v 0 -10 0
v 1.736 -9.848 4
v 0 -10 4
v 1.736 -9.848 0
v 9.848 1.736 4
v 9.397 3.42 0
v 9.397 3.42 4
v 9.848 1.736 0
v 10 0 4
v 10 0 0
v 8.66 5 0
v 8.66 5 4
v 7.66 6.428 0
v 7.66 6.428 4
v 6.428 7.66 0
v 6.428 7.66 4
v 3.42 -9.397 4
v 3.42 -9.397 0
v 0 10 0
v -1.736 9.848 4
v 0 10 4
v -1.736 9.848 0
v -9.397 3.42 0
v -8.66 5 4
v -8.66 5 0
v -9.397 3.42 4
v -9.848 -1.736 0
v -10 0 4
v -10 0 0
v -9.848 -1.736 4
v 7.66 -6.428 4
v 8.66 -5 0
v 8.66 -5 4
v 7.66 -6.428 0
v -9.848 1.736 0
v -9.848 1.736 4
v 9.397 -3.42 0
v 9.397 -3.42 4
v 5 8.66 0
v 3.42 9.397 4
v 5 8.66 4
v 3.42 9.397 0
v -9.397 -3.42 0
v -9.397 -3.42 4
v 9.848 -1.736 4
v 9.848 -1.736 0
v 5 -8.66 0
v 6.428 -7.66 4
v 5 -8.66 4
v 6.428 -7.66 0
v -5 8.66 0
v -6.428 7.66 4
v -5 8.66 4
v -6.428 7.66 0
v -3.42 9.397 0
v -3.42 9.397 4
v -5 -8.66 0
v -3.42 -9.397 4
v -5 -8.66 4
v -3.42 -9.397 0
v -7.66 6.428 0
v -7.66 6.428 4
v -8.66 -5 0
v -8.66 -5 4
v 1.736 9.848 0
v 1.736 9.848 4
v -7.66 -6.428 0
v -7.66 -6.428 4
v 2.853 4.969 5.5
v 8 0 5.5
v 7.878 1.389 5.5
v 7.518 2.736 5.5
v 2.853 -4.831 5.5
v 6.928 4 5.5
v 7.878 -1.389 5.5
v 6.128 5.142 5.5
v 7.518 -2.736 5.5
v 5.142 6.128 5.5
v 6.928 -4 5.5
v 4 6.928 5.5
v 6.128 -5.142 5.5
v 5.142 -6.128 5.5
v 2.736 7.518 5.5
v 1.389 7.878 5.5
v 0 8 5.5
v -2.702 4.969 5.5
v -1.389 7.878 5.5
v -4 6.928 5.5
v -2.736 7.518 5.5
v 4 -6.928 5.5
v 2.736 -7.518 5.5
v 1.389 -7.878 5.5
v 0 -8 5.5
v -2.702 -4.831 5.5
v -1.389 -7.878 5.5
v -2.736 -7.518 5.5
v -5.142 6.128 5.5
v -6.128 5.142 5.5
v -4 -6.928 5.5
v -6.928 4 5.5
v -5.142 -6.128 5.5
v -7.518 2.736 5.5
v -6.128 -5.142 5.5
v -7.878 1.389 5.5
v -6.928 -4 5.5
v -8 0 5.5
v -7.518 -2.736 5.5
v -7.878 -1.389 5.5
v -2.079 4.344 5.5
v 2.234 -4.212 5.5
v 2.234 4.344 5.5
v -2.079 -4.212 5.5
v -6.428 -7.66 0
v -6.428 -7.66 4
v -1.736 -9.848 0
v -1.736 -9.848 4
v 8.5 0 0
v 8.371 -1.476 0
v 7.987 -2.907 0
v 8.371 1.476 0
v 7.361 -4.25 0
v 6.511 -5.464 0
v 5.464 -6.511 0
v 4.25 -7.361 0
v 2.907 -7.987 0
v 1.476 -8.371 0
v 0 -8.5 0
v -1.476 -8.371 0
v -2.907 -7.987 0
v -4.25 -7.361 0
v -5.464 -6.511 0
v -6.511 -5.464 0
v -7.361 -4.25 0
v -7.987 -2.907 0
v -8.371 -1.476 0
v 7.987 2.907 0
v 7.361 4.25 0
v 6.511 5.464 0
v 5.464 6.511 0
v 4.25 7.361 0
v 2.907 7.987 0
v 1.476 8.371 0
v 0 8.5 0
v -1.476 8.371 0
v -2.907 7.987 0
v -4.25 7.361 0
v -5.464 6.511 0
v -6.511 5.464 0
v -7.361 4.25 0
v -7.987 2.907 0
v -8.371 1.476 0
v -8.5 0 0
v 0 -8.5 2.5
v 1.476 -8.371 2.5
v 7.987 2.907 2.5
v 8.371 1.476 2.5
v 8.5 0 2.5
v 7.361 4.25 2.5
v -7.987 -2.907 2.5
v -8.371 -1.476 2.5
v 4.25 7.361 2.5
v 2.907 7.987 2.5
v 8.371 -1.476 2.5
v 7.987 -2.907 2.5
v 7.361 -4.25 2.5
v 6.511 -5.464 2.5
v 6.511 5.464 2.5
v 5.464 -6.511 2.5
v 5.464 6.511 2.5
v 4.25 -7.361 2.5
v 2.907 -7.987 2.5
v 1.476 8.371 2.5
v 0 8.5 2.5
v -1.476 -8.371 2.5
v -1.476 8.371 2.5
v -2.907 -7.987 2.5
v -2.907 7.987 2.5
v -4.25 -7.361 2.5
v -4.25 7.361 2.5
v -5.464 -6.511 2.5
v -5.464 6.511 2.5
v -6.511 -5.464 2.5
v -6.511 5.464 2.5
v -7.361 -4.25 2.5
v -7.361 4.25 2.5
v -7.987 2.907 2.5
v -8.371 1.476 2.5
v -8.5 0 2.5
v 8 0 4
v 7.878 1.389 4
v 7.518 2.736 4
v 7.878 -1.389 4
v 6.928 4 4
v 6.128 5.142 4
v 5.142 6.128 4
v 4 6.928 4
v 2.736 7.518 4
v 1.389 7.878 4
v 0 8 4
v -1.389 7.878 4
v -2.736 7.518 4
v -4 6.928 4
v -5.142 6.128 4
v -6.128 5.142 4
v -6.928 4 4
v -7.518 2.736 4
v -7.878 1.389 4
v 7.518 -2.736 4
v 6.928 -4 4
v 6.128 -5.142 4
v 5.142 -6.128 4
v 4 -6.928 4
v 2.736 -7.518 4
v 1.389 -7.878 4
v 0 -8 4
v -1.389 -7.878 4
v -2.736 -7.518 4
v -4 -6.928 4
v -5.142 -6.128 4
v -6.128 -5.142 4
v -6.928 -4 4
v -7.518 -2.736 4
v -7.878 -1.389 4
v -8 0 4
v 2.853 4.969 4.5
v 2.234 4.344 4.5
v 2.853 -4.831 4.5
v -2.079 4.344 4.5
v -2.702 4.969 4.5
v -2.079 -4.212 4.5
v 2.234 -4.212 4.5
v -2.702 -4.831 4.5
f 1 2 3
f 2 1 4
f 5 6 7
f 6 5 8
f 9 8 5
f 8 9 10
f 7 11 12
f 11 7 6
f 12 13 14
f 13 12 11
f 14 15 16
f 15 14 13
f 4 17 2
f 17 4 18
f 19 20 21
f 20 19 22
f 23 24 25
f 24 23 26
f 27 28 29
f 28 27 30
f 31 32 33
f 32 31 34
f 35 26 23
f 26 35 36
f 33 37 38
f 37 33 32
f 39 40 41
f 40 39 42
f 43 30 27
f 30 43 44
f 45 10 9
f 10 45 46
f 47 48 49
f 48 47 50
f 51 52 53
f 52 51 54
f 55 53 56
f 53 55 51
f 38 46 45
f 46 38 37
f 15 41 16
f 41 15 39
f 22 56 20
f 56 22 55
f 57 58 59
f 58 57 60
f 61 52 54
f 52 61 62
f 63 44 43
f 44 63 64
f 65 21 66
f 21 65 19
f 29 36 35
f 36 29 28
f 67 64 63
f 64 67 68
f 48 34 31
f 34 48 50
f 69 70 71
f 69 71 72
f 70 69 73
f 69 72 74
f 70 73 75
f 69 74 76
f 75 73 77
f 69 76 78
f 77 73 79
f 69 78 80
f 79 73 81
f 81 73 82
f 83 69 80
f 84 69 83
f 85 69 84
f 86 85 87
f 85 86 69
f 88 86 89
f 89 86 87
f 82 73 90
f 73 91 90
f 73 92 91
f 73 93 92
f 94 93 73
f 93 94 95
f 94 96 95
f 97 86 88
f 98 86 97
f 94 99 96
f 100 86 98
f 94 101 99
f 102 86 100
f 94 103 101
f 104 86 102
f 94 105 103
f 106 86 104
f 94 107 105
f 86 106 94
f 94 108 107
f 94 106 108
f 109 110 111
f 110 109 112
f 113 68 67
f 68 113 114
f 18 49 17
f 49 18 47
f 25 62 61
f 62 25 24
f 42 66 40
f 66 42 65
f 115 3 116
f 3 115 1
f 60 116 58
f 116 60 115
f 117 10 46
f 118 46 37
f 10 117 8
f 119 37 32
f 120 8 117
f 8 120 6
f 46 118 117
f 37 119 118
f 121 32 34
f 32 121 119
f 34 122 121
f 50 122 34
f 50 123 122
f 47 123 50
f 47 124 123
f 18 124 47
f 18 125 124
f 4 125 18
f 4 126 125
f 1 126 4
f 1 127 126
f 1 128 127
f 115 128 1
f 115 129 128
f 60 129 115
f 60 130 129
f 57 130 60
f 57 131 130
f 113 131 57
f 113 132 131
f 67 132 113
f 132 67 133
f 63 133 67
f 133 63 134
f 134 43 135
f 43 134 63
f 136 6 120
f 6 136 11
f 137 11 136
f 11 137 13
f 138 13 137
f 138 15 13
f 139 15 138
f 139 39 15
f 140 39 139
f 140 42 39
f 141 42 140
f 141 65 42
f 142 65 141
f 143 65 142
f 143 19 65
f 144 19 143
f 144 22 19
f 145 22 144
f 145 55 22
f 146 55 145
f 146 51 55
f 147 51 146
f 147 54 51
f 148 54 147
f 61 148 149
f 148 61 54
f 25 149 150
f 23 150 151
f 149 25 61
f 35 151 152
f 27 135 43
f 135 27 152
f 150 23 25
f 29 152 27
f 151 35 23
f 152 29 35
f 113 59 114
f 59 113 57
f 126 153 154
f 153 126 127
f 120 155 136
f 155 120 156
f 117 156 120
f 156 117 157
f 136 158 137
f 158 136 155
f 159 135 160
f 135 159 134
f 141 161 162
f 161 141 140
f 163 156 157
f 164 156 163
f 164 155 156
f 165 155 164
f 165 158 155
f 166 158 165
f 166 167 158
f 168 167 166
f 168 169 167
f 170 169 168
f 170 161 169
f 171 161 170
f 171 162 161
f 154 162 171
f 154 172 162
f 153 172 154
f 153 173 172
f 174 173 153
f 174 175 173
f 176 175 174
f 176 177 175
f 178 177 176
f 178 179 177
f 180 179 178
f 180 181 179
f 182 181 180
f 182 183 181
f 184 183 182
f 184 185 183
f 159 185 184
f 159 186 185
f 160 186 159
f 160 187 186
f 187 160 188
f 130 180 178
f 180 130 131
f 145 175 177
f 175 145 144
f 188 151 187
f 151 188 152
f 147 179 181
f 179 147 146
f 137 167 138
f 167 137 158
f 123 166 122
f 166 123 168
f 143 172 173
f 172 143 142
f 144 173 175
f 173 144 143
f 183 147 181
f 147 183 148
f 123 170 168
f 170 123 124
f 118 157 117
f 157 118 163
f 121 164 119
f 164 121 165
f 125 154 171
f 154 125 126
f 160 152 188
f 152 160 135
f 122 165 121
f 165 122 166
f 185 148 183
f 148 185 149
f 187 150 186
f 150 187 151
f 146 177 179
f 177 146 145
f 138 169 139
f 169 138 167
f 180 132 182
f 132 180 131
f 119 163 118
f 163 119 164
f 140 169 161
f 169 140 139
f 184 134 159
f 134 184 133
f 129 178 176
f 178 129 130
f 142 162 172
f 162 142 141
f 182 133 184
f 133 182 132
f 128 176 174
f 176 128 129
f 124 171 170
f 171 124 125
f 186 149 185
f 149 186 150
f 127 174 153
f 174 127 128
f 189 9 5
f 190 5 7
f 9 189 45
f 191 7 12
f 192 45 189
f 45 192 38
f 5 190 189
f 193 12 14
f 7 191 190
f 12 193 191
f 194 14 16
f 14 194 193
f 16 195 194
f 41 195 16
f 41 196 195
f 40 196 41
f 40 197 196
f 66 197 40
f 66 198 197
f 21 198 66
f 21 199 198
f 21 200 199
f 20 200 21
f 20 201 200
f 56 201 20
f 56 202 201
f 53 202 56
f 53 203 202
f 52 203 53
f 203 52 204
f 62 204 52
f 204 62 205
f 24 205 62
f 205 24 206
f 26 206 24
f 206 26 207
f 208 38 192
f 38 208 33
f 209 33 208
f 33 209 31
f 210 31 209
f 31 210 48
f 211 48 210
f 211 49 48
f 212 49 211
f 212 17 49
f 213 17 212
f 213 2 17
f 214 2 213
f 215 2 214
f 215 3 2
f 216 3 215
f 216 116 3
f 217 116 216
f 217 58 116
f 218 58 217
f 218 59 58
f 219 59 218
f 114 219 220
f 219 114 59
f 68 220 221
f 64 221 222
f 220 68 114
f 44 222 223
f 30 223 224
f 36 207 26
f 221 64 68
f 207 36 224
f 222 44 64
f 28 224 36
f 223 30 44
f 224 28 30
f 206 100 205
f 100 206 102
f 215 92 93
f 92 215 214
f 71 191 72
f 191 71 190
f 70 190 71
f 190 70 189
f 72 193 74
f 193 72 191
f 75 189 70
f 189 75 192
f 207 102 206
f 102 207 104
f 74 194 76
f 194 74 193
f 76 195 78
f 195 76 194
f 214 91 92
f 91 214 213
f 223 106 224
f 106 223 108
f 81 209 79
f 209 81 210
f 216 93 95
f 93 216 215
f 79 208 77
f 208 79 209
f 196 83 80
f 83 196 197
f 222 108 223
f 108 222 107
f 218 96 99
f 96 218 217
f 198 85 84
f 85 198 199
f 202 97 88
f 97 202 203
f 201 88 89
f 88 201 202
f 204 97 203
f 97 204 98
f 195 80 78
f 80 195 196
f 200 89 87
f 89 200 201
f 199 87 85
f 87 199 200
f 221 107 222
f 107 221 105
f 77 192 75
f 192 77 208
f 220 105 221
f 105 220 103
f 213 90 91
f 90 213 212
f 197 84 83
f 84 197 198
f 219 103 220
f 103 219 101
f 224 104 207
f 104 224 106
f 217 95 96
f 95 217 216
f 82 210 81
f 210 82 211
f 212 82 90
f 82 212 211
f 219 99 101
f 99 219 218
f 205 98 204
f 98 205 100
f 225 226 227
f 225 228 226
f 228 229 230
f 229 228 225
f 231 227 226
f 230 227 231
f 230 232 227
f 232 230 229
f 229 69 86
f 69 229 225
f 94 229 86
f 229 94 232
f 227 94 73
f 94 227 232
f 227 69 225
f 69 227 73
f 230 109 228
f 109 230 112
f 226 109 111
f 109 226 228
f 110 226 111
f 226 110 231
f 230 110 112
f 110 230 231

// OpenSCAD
difference() {
	difference() {
		difference() {
			cylinder($fn = 36, h = 5.5000000000, r = 10);
			translate(v = [0, 0, -1]) {
				cylinder($fn = 36, h = 3.5000000000, r = 8.5000000000);
			}
		}
		translate(v = [0, 0, 4]) {
			difference() {
				cylinder($fn = 36, h = 3, r = 10.5000000000);
				cylinder($fn = 36, h = 3, r = 8);
			}
		}
	}
	translate(v = [0, 0, 4.5000000000]) {
		linear_extrude(height = 3) {
			text(font = "mana", halign = "center", size = 8, text = "\uE602", valign = "center");
		}
	}
}
